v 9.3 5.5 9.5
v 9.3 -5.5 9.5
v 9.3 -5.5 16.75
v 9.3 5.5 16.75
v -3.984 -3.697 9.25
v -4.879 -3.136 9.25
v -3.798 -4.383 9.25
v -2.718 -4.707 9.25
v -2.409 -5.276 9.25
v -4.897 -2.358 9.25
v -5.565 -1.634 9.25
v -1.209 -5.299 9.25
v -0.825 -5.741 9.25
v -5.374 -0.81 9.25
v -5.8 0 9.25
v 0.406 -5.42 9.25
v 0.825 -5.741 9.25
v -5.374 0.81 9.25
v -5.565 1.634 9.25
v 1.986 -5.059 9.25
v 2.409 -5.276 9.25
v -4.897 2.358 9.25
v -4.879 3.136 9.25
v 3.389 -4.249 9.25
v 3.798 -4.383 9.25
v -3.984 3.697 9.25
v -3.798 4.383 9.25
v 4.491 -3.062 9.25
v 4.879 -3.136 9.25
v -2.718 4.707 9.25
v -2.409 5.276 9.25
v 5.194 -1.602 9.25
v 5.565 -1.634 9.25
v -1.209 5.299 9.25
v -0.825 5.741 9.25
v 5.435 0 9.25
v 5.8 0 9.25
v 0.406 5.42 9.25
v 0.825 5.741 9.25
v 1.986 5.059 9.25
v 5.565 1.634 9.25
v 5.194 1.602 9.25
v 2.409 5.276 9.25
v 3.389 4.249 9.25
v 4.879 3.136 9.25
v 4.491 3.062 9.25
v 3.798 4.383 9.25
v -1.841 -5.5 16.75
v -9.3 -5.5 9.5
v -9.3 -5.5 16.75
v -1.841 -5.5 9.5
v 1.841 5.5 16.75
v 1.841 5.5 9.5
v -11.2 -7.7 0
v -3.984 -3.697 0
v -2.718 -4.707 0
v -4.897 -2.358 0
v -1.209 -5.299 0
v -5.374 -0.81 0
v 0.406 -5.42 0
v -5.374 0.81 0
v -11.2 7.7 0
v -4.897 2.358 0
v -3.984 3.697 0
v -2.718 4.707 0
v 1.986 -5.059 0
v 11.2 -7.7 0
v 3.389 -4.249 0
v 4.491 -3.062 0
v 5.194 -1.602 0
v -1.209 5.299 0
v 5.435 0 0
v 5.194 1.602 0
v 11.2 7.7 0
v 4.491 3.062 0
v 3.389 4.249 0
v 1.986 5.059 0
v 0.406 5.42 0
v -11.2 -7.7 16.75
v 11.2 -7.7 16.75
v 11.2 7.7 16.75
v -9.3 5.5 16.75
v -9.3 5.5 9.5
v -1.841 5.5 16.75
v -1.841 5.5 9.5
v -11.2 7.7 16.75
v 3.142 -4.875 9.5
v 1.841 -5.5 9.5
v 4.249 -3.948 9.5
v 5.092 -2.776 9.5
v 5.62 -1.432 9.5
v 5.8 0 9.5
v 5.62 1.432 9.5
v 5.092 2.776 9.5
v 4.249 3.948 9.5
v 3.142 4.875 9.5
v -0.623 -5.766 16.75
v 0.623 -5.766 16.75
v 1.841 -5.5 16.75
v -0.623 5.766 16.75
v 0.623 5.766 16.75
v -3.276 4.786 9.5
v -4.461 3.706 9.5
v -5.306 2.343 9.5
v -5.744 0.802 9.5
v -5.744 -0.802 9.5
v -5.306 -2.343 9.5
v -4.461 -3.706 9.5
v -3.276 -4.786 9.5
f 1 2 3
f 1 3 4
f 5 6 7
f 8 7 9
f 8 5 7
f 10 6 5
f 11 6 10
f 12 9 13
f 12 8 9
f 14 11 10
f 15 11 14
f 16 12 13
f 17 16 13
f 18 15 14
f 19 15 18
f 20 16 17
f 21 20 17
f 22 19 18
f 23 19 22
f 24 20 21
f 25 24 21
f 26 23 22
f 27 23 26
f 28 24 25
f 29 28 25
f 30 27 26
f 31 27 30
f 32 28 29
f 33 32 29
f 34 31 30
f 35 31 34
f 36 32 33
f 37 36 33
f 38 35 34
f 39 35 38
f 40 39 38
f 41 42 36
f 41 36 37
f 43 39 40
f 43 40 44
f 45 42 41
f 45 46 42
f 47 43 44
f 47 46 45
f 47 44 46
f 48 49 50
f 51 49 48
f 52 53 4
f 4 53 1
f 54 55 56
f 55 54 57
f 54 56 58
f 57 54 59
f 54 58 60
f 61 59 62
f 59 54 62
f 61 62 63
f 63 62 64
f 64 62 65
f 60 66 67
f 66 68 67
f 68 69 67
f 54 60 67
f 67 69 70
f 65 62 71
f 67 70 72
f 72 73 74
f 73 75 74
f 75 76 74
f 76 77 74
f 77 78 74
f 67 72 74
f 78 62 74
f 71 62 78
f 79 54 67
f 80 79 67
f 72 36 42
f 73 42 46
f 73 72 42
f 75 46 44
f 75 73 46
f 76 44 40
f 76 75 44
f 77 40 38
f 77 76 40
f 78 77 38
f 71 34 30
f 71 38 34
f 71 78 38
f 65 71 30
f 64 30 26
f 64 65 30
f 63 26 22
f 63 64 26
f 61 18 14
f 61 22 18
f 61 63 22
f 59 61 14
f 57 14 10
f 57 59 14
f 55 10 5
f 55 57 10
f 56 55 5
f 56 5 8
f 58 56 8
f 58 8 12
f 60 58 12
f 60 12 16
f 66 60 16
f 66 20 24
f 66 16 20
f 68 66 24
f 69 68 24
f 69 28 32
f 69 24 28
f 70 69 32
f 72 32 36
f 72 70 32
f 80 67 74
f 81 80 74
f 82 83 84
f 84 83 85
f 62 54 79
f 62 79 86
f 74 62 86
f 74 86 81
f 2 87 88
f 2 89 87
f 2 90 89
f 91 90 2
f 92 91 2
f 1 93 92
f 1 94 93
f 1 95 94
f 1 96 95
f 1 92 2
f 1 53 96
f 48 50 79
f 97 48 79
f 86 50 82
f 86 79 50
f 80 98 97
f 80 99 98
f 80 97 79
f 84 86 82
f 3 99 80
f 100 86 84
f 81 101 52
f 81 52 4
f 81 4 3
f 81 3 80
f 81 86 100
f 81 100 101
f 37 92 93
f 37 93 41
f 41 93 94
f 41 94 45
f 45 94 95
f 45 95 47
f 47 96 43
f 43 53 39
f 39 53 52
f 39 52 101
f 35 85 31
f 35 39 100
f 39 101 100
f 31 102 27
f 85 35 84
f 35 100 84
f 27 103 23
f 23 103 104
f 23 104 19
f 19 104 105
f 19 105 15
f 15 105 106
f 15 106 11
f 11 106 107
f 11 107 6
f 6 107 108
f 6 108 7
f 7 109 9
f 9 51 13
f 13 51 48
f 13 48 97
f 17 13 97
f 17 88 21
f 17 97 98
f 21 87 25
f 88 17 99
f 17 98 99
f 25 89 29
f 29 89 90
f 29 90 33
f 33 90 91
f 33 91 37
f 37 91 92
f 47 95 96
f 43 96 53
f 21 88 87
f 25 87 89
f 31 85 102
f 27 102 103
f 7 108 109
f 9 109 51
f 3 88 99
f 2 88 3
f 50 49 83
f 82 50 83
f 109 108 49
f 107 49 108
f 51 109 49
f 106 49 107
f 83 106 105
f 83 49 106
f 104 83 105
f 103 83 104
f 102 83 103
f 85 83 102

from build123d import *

# Parameters (mm, degrees)
F0_W     = 22.4
F0_H     = 15.4
F0_W_2   = 18.6
F0_H_2   = 11
F1_DEPTH = 16.75
F0_R     = 5.435
F2_DEPTH = 9.5
F3_R     = 5.8
F4_DEPTH = 7.5


with BuildPart() as f1:
    # F0 (on Top) → F1 (new body)
    with BuildSketch(Plane.XY):
        Rectangle(F0_W, F0_H)
        Rectangle(F0_W_2, F0_H_2, mode=Mode.SUBTRACT)
    extrude(amount=F1_DEPTH)

    # F0 (on Top) → F2 (join)
    with BuildSketch(Plane.XY):
        Rectangle(F0_W_2, F0_H_2)
        Circle(F0_R, mode=Mode.SUBTRACT)
    extrude(amount=F2_DEPTH)

    # F3 (on face) → F4 (cut)
    with BuildSketch(Plane.XY.offset(16.75)):
        Circle(F3_R)
    extrude(amount=-F4_DEPTH, mode=Mode.SUBTRACT)


solid = f1.part
